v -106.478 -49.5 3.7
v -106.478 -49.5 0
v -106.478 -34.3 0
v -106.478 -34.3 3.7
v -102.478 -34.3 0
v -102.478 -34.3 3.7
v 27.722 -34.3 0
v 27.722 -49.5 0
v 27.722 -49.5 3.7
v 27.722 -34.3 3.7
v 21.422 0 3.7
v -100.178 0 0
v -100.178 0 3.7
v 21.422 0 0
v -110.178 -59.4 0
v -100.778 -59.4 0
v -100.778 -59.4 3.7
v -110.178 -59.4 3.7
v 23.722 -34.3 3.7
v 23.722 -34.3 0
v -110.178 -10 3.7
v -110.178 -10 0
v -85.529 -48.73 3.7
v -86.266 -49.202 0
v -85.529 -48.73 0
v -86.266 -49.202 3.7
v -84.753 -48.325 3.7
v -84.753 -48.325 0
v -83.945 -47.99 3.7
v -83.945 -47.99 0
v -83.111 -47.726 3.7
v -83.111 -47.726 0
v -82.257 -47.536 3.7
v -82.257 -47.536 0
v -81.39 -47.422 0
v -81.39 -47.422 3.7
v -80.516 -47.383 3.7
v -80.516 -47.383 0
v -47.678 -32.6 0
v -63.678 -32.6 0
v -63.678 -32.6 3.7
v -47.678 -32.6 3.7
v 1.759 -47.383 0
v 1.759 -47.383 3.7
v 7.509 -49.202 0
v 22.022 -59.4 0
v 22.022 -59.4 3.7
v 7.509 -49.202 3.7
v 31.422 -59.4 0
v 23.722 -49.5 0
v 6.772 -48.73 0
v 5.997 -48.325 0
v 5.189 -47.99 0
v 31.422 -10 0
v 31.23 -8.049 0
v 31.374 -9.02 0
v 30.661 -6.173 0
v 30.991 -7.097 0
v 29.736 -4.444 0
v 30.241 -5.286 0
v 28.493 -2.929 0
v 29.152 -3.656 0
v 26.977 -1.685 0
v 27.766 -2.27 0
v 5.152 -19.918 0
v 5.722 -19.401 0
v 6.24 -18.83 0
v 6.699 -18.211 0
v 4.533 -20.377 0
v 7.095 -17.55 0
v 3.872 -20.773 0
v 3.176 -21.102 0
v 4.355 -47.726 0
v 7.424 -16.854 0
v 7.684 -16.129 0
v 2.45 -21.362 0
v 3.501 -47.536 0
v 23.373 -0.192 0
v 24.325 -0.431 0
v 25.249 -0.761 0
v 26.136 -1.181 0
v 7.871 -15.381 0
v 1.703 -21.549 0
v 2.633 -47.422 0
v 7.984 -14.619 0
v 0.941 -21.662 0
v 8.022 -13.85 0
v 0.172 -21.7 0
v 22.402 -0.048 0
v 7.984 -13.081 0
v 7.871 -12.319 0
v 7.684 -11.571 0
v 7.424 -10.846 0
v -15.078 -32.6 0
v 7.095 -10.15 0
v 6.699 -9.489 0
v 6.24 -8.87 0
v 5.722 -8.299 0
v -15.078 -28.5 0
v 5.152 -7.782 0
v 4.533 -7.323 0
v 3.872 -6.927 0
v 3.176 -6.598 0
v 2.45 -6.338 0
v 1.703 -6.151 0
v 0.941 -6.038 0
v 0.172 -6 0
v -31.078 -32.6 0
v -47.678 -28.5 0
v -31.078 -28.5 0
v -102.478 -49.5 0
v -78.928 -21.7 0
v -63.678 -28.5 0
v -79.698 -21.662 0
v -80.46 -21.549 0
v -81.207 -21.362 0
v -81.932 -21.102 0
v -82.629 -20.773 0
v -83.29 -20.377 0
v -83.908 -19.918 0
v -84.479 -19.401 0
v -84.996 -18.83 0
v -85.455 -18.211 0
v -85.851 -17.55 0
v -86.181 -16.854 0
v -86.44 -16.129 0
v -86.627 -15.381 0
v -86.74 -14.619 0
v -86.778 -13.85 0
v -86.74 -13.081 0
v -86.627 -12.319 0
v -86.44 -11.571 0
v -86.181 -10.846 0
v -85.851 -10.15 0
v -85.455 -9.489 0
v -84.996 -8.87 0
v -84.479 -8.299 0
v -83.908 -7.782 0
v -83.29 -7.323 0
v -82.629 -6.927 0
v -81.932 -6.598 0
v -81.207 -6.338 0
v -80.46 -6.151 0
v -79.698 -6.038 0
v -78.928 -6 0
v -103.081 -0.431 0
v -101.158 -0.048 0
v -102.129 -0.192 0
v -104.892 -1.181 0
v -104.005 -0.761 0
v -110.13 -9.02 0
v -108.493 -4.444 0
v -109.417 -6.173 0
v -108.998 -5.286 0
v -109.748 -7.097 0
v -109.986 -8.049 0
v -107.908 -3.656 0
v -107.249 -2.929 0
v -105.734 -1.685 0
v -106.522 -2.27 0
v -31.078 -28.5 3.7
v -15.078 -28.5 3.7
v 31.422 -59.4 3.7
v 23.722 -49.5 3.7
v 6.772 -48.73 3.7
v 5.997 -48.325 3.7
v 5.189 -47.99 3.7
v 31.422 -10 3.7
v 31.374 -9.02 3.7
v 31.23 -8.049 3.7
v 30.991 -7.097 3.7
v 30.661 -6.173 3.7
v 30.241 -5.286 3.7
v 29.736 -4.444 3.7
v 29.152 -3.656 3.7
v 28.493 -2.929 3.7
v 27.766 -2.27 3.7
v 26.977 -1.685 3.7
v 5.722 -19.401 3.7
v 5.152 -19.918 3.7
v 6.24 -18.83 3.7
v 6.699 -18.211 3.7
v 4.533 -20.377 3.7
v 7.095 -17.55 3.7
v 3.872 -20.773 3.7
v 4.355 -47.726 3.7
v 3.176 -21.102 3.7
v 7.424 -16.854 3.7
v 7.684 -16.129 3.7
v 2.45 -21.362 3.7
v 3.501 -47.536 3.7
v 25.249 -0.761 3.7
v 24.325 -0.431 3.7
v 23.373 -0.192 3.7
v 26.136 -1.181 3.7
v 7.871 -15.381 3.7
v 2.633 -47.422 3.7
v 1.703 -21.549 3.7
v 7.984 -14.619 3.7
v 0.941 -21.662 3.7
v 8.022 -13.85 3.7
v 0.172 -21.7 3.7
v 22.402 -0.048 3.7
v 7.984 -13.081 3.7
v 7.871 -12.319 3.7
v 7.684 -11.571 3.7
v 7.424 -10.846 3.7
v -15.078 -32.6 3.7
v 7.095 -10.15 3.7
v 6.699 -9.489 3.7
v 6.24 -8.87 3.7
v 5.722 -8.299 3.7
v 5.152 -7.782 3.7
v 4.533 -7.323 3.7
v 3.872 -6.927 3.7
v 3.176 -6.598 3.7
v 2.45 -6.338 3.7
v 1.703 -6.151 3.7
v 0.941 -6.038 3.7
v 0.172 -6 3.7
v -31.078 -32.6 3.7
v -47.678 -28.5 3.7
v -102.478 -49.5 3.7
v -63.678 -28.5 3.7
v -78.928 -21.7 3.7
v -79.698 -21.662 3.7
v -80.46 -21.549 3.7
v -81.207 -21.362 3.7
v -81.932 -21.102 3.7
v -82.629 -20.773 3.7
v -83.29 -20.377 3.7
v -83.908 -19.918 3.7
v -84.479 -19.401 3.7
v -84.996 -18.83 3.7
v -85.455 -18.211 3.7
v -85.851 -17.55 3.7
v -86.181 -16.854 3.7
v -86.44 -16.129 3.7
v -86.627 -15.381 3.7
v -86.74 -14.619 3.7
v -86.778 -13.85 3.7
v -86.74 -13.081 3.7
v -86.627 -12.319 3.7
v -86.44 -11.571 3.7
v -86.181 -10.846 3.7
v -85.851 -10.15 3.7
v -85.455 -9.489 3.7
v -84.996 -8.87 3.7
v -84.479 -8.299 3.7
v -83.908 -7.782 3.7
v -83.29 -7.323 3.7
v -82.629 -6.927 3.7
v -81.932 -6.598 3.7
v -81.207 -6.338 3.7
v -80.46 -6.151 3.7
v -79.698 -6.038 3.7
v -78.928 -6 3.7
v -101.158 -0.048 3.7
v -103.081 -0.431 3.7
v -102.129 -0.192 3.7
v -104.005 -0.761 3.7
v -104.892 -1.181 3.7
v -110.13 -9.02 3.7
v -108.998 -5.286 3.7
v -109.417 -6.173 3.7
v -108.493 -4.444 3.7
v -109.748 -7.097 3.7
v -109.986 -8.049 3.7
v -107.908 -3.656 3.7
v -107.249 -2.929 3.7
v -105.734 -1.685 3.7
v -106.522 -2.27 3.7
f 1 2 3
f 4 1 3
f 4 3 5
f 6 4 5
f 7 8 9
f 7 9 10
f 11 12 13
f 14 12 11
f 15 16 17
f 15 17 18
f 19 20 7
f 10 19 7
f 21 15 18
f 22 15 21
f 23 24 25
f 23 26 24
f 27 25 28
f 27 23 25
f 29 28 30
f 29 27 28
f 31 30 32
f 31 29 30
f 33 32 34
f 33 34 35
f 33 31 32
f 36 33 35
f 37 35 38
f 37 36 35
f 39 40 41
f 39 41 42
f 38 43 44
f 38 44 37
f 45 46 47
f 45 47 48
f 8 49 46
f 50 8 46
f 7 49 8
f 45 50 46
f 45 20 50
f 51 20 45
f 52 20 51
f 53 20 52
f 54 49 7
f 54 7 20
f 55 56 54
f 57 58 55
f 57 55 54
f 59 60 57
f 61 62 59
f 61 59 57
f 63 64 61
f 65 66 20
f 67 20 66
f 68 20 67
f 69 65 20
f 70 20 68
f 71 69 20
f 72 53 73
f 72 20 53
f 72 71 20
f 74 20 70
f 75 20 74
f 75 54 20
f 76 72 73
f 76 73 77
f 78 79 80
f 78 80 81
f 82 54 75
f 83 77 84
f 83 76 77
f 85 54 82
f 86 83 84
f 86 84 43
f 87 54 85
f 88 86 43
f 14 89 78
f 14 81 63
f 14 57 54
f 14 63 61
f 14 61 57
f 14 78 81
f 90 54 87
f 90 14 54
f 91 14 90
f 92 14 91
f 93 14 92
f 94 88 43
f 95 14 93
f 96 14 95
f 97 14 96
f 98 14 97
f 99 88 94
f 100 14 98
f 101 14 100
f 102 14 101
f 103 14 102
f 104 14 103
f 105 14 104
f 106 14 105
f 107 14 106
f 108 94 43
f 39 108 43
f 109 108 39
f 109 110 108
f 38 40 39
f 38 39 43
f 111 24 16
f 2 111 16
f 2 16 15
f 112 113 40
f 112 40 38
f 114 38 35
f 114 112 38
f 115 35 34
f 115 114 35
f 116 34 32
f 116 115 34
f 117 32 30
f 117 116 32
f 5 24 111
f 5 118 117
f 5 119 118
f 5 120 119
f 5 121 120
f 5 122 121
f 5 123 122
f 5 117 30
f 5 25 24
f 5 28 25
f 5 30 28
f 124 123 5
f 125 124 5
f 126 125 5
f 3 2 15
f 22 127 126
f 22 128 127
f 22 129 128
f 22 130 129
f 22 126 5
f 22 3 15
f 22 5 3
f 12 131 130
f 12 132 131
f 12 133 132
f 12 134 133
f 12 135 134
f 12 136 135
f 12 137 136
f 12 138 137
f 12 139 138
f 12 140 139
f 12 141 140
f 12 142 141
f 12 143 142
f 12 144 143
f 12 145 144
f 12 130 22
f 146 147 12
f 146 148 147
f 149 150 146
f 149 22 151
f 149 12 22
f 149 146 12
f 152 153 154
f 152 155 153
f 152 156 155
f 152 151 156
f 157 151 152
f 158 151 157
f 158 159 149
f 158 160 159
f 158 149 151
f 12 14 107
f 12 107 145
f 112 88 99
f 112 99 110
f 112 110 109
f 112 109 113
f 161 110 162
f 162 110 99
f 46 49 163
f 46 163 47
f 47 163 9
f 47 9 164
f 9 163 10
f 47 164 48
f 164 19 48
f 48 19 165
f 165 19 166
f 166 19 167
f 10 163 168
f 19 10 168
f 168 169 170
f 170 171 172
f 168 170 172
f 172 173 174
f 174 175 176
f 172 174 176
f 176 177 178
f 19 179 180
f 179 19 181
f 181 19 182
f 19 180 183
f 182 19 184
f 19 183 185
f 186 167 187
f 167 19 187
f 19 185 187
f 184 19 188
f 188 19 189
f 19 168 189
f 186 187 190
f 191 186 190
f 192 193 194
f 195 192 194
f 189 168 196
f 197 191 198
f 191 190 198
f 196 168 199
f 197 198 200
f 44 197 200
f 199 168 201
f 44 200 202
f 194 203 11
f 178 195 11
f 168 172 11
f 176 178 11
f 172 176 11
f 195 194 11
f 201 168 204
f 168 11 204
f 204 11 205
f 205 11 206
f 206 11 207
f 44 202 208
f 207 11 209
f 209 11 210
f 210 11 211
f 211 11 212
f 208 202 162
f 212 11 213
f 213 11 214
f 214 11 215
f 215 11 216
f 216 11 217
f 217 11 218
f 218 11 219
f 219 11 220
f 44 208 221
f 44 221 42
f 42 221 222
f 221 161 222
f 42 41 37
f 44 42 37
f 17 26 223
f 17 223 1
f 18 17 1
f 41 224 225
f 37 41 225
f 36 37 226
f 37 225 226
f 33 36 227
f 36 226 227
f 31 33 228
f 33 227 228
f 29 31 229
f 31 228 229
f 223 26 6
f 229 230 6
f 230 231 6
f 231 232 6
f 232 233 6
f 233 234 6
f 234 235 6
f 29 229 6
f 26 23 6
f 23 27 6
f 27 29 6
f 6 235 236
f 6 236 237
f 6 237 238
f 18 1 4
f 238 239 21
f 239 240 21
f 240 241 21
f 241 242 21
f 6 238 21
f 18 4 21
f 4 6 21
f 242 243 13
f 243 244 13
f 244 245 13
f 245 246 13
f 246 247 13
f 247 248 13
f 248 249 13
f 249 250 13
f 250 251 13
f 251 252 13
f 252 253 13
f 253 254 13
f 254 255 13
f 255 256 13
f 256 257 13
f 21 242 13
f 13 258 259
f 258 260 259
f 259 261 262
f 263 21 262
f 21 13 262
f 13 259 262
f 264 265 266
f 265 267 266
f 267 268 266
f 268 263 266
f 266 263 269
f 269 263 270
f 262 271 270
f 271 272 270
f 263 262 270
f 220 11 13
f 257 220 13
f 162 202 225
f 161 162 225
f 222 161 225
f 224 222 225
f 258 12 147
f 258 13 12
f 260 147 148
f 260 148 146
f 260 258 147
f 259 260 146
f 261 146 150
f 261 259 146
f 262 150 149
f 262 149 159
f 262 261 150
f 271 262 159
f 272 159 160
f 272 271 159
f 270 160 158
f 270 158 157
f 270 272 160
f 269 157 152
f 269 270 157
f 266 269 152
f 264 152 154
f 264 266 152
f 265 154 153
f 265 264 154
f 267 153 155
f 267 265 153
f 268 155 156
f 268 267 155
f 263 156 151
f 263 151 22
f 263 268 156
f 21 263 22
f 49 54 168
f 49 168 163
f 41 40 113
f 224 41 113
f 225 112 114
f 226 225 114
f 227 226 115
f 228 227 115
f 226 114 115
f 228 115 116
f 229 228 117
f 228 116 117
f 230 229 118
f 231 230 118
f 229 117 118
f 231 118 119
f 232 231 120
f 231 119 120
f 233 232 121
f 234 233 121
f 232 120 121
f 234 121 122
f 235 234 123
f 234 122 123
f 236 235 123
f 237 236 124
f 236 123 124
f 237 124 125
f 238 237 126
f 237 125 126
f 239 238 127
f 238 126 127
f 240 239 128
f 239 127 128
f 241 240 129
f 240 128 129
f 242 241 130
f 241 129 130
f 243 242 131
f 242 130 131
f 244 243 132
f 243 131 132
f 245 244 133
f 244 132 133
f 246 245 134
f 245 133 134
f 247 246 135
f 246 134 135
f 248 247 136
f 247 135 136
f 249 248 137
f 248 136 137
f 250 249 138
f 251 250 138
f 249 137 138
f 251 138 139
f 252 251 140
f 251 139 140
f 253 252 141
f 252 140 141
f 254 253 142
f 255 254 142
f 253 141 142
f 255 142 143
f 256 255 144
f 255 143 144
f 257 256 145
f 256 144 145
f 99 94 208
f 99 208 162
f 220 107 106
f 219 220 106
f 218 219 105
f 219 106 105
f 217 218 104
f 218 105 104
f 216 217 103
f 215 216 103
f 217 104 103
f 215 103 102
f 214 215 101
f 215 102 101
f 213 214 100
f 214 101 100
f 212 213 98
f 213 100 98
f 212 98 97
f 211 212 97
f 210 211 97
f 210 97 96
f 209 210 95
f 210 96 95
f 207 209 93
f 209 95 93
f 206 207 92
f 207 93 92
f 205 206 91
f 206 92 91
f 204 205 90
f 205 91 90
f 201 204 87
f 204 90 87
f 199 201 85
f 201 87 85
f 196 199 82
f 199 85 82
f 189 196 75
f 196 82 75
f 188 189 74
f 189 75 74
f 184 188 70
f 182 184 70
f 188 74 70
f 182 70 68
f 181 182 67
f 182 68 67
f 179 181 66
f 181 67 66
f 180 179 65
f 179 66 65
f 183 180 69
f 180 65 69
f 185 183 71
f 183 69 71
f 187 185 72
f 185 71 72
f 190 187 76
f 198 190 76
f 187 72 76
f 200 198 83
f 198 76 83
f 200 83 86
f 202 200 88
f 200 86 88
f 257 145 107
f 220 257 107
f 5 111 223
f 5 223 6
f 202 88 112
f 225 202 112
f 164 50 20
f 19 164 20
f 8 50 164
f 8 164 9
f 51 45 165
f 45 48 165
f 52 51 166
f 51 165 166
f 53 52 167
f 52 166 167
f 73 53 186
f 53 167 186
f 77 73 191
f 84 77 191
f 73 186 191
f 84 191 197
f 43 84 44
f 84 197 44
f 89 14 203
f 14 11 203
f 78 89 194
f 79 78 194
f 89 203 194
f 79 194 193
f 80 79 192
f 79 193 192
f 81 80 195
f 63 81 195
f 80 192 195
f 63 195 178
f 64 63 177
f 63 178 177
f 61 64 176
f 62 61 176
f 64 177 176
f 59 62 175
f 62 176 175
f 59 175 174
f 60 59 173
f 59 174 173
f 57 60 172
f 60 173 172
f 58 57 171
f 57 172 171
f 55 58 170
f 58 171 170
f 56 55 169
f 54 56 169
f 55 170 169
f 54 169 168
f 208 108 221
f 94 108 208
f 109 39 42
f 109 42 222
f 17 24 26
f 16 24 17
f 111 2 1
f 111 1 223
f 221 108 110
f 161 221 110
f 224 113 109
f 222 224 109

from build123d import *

# Parameters (mm, degrees)
SKETCH1_W           = 16
SKETCH1_H           = 4.1
SKETCH1_W_2         = 4
SKETCH1_H_2         = 15.2
BOSS_EXTRUDE2_DEPTH = 3.7
FILLET1_R           = 10
FILLET2_R           = 10


with BuildPart() as part:
    # Sketch1 → Boss-Extrude2 (new body)
    with BuildSketch(Plane.XY):
        Polygon((-110.178290248, 0), (31.421709752, 0), (31.421709752, -59.4), (22.021709752, -59.4), (4.921709752, -47.383344891), (-83.678290248, -47.383344891), (-100.778290248, -59.4), (-110.178290248, -59.4), align=None)
        with BuildLine():
            Line((0.171709752, -21.7), (-78.928290248, -21.7))
            ThreePointArc((-78.928290248, -21.7), (-86.778290248, -13.85), (-78.928290248, -6))
            Line((-78.928290248, -6), (0.171709752, -6))
            ThreePointArc((0.171709752, -6), (8.021709752, -13.85), (0.171709752, -21.7))
        make_face(mode=Mode.SUBTRACT)
        with Locations((-23.078290248, -30.55)):
            Rectangle(SKETCH1_W, SKETCH1_H, mode=Mode.SUBTRACT)
        with Locations((-55.678290248, -30.55)):
            Rectangle(SKETCH1_W, SKETCH1_H, mode=Mode.SUBTRACT)
        with Locations((25.721709752, -41.9)):
            Rectangle(SKETCH1_W_2, SKETCH1_H_2, mode=Mode.SUBTRACT)
        with Locations((-104.478290248, -41.9)):
            Rectangle(SKETCH1_W_2, SKETCH1_H_2, mode=Mode.SUBTRACT)
    extrude(amount=BOSS_EXTRUDE2_DEPTH)

    # Fillet1
    fillet1_edges = [part.edges().sort_by_distance(p)[0] for p in [
        (-110.178290248, 0, 1.85),
        (31.421709752, 0, 1.85),
    ]]
    fillet(fillet1_edges, radius=FILLET1_R)

    # Fillet2
    fillet2_edges = [part.edges().sort_by_distance(p)[0] for p in [
        (4.921709752, -47.383344891, 1.85),
        (-83.678290248, -47.383344891, 1.85),
    ]]
    fillet(fillet2_edges, radius=FILLET2_R)


solid = part.part
